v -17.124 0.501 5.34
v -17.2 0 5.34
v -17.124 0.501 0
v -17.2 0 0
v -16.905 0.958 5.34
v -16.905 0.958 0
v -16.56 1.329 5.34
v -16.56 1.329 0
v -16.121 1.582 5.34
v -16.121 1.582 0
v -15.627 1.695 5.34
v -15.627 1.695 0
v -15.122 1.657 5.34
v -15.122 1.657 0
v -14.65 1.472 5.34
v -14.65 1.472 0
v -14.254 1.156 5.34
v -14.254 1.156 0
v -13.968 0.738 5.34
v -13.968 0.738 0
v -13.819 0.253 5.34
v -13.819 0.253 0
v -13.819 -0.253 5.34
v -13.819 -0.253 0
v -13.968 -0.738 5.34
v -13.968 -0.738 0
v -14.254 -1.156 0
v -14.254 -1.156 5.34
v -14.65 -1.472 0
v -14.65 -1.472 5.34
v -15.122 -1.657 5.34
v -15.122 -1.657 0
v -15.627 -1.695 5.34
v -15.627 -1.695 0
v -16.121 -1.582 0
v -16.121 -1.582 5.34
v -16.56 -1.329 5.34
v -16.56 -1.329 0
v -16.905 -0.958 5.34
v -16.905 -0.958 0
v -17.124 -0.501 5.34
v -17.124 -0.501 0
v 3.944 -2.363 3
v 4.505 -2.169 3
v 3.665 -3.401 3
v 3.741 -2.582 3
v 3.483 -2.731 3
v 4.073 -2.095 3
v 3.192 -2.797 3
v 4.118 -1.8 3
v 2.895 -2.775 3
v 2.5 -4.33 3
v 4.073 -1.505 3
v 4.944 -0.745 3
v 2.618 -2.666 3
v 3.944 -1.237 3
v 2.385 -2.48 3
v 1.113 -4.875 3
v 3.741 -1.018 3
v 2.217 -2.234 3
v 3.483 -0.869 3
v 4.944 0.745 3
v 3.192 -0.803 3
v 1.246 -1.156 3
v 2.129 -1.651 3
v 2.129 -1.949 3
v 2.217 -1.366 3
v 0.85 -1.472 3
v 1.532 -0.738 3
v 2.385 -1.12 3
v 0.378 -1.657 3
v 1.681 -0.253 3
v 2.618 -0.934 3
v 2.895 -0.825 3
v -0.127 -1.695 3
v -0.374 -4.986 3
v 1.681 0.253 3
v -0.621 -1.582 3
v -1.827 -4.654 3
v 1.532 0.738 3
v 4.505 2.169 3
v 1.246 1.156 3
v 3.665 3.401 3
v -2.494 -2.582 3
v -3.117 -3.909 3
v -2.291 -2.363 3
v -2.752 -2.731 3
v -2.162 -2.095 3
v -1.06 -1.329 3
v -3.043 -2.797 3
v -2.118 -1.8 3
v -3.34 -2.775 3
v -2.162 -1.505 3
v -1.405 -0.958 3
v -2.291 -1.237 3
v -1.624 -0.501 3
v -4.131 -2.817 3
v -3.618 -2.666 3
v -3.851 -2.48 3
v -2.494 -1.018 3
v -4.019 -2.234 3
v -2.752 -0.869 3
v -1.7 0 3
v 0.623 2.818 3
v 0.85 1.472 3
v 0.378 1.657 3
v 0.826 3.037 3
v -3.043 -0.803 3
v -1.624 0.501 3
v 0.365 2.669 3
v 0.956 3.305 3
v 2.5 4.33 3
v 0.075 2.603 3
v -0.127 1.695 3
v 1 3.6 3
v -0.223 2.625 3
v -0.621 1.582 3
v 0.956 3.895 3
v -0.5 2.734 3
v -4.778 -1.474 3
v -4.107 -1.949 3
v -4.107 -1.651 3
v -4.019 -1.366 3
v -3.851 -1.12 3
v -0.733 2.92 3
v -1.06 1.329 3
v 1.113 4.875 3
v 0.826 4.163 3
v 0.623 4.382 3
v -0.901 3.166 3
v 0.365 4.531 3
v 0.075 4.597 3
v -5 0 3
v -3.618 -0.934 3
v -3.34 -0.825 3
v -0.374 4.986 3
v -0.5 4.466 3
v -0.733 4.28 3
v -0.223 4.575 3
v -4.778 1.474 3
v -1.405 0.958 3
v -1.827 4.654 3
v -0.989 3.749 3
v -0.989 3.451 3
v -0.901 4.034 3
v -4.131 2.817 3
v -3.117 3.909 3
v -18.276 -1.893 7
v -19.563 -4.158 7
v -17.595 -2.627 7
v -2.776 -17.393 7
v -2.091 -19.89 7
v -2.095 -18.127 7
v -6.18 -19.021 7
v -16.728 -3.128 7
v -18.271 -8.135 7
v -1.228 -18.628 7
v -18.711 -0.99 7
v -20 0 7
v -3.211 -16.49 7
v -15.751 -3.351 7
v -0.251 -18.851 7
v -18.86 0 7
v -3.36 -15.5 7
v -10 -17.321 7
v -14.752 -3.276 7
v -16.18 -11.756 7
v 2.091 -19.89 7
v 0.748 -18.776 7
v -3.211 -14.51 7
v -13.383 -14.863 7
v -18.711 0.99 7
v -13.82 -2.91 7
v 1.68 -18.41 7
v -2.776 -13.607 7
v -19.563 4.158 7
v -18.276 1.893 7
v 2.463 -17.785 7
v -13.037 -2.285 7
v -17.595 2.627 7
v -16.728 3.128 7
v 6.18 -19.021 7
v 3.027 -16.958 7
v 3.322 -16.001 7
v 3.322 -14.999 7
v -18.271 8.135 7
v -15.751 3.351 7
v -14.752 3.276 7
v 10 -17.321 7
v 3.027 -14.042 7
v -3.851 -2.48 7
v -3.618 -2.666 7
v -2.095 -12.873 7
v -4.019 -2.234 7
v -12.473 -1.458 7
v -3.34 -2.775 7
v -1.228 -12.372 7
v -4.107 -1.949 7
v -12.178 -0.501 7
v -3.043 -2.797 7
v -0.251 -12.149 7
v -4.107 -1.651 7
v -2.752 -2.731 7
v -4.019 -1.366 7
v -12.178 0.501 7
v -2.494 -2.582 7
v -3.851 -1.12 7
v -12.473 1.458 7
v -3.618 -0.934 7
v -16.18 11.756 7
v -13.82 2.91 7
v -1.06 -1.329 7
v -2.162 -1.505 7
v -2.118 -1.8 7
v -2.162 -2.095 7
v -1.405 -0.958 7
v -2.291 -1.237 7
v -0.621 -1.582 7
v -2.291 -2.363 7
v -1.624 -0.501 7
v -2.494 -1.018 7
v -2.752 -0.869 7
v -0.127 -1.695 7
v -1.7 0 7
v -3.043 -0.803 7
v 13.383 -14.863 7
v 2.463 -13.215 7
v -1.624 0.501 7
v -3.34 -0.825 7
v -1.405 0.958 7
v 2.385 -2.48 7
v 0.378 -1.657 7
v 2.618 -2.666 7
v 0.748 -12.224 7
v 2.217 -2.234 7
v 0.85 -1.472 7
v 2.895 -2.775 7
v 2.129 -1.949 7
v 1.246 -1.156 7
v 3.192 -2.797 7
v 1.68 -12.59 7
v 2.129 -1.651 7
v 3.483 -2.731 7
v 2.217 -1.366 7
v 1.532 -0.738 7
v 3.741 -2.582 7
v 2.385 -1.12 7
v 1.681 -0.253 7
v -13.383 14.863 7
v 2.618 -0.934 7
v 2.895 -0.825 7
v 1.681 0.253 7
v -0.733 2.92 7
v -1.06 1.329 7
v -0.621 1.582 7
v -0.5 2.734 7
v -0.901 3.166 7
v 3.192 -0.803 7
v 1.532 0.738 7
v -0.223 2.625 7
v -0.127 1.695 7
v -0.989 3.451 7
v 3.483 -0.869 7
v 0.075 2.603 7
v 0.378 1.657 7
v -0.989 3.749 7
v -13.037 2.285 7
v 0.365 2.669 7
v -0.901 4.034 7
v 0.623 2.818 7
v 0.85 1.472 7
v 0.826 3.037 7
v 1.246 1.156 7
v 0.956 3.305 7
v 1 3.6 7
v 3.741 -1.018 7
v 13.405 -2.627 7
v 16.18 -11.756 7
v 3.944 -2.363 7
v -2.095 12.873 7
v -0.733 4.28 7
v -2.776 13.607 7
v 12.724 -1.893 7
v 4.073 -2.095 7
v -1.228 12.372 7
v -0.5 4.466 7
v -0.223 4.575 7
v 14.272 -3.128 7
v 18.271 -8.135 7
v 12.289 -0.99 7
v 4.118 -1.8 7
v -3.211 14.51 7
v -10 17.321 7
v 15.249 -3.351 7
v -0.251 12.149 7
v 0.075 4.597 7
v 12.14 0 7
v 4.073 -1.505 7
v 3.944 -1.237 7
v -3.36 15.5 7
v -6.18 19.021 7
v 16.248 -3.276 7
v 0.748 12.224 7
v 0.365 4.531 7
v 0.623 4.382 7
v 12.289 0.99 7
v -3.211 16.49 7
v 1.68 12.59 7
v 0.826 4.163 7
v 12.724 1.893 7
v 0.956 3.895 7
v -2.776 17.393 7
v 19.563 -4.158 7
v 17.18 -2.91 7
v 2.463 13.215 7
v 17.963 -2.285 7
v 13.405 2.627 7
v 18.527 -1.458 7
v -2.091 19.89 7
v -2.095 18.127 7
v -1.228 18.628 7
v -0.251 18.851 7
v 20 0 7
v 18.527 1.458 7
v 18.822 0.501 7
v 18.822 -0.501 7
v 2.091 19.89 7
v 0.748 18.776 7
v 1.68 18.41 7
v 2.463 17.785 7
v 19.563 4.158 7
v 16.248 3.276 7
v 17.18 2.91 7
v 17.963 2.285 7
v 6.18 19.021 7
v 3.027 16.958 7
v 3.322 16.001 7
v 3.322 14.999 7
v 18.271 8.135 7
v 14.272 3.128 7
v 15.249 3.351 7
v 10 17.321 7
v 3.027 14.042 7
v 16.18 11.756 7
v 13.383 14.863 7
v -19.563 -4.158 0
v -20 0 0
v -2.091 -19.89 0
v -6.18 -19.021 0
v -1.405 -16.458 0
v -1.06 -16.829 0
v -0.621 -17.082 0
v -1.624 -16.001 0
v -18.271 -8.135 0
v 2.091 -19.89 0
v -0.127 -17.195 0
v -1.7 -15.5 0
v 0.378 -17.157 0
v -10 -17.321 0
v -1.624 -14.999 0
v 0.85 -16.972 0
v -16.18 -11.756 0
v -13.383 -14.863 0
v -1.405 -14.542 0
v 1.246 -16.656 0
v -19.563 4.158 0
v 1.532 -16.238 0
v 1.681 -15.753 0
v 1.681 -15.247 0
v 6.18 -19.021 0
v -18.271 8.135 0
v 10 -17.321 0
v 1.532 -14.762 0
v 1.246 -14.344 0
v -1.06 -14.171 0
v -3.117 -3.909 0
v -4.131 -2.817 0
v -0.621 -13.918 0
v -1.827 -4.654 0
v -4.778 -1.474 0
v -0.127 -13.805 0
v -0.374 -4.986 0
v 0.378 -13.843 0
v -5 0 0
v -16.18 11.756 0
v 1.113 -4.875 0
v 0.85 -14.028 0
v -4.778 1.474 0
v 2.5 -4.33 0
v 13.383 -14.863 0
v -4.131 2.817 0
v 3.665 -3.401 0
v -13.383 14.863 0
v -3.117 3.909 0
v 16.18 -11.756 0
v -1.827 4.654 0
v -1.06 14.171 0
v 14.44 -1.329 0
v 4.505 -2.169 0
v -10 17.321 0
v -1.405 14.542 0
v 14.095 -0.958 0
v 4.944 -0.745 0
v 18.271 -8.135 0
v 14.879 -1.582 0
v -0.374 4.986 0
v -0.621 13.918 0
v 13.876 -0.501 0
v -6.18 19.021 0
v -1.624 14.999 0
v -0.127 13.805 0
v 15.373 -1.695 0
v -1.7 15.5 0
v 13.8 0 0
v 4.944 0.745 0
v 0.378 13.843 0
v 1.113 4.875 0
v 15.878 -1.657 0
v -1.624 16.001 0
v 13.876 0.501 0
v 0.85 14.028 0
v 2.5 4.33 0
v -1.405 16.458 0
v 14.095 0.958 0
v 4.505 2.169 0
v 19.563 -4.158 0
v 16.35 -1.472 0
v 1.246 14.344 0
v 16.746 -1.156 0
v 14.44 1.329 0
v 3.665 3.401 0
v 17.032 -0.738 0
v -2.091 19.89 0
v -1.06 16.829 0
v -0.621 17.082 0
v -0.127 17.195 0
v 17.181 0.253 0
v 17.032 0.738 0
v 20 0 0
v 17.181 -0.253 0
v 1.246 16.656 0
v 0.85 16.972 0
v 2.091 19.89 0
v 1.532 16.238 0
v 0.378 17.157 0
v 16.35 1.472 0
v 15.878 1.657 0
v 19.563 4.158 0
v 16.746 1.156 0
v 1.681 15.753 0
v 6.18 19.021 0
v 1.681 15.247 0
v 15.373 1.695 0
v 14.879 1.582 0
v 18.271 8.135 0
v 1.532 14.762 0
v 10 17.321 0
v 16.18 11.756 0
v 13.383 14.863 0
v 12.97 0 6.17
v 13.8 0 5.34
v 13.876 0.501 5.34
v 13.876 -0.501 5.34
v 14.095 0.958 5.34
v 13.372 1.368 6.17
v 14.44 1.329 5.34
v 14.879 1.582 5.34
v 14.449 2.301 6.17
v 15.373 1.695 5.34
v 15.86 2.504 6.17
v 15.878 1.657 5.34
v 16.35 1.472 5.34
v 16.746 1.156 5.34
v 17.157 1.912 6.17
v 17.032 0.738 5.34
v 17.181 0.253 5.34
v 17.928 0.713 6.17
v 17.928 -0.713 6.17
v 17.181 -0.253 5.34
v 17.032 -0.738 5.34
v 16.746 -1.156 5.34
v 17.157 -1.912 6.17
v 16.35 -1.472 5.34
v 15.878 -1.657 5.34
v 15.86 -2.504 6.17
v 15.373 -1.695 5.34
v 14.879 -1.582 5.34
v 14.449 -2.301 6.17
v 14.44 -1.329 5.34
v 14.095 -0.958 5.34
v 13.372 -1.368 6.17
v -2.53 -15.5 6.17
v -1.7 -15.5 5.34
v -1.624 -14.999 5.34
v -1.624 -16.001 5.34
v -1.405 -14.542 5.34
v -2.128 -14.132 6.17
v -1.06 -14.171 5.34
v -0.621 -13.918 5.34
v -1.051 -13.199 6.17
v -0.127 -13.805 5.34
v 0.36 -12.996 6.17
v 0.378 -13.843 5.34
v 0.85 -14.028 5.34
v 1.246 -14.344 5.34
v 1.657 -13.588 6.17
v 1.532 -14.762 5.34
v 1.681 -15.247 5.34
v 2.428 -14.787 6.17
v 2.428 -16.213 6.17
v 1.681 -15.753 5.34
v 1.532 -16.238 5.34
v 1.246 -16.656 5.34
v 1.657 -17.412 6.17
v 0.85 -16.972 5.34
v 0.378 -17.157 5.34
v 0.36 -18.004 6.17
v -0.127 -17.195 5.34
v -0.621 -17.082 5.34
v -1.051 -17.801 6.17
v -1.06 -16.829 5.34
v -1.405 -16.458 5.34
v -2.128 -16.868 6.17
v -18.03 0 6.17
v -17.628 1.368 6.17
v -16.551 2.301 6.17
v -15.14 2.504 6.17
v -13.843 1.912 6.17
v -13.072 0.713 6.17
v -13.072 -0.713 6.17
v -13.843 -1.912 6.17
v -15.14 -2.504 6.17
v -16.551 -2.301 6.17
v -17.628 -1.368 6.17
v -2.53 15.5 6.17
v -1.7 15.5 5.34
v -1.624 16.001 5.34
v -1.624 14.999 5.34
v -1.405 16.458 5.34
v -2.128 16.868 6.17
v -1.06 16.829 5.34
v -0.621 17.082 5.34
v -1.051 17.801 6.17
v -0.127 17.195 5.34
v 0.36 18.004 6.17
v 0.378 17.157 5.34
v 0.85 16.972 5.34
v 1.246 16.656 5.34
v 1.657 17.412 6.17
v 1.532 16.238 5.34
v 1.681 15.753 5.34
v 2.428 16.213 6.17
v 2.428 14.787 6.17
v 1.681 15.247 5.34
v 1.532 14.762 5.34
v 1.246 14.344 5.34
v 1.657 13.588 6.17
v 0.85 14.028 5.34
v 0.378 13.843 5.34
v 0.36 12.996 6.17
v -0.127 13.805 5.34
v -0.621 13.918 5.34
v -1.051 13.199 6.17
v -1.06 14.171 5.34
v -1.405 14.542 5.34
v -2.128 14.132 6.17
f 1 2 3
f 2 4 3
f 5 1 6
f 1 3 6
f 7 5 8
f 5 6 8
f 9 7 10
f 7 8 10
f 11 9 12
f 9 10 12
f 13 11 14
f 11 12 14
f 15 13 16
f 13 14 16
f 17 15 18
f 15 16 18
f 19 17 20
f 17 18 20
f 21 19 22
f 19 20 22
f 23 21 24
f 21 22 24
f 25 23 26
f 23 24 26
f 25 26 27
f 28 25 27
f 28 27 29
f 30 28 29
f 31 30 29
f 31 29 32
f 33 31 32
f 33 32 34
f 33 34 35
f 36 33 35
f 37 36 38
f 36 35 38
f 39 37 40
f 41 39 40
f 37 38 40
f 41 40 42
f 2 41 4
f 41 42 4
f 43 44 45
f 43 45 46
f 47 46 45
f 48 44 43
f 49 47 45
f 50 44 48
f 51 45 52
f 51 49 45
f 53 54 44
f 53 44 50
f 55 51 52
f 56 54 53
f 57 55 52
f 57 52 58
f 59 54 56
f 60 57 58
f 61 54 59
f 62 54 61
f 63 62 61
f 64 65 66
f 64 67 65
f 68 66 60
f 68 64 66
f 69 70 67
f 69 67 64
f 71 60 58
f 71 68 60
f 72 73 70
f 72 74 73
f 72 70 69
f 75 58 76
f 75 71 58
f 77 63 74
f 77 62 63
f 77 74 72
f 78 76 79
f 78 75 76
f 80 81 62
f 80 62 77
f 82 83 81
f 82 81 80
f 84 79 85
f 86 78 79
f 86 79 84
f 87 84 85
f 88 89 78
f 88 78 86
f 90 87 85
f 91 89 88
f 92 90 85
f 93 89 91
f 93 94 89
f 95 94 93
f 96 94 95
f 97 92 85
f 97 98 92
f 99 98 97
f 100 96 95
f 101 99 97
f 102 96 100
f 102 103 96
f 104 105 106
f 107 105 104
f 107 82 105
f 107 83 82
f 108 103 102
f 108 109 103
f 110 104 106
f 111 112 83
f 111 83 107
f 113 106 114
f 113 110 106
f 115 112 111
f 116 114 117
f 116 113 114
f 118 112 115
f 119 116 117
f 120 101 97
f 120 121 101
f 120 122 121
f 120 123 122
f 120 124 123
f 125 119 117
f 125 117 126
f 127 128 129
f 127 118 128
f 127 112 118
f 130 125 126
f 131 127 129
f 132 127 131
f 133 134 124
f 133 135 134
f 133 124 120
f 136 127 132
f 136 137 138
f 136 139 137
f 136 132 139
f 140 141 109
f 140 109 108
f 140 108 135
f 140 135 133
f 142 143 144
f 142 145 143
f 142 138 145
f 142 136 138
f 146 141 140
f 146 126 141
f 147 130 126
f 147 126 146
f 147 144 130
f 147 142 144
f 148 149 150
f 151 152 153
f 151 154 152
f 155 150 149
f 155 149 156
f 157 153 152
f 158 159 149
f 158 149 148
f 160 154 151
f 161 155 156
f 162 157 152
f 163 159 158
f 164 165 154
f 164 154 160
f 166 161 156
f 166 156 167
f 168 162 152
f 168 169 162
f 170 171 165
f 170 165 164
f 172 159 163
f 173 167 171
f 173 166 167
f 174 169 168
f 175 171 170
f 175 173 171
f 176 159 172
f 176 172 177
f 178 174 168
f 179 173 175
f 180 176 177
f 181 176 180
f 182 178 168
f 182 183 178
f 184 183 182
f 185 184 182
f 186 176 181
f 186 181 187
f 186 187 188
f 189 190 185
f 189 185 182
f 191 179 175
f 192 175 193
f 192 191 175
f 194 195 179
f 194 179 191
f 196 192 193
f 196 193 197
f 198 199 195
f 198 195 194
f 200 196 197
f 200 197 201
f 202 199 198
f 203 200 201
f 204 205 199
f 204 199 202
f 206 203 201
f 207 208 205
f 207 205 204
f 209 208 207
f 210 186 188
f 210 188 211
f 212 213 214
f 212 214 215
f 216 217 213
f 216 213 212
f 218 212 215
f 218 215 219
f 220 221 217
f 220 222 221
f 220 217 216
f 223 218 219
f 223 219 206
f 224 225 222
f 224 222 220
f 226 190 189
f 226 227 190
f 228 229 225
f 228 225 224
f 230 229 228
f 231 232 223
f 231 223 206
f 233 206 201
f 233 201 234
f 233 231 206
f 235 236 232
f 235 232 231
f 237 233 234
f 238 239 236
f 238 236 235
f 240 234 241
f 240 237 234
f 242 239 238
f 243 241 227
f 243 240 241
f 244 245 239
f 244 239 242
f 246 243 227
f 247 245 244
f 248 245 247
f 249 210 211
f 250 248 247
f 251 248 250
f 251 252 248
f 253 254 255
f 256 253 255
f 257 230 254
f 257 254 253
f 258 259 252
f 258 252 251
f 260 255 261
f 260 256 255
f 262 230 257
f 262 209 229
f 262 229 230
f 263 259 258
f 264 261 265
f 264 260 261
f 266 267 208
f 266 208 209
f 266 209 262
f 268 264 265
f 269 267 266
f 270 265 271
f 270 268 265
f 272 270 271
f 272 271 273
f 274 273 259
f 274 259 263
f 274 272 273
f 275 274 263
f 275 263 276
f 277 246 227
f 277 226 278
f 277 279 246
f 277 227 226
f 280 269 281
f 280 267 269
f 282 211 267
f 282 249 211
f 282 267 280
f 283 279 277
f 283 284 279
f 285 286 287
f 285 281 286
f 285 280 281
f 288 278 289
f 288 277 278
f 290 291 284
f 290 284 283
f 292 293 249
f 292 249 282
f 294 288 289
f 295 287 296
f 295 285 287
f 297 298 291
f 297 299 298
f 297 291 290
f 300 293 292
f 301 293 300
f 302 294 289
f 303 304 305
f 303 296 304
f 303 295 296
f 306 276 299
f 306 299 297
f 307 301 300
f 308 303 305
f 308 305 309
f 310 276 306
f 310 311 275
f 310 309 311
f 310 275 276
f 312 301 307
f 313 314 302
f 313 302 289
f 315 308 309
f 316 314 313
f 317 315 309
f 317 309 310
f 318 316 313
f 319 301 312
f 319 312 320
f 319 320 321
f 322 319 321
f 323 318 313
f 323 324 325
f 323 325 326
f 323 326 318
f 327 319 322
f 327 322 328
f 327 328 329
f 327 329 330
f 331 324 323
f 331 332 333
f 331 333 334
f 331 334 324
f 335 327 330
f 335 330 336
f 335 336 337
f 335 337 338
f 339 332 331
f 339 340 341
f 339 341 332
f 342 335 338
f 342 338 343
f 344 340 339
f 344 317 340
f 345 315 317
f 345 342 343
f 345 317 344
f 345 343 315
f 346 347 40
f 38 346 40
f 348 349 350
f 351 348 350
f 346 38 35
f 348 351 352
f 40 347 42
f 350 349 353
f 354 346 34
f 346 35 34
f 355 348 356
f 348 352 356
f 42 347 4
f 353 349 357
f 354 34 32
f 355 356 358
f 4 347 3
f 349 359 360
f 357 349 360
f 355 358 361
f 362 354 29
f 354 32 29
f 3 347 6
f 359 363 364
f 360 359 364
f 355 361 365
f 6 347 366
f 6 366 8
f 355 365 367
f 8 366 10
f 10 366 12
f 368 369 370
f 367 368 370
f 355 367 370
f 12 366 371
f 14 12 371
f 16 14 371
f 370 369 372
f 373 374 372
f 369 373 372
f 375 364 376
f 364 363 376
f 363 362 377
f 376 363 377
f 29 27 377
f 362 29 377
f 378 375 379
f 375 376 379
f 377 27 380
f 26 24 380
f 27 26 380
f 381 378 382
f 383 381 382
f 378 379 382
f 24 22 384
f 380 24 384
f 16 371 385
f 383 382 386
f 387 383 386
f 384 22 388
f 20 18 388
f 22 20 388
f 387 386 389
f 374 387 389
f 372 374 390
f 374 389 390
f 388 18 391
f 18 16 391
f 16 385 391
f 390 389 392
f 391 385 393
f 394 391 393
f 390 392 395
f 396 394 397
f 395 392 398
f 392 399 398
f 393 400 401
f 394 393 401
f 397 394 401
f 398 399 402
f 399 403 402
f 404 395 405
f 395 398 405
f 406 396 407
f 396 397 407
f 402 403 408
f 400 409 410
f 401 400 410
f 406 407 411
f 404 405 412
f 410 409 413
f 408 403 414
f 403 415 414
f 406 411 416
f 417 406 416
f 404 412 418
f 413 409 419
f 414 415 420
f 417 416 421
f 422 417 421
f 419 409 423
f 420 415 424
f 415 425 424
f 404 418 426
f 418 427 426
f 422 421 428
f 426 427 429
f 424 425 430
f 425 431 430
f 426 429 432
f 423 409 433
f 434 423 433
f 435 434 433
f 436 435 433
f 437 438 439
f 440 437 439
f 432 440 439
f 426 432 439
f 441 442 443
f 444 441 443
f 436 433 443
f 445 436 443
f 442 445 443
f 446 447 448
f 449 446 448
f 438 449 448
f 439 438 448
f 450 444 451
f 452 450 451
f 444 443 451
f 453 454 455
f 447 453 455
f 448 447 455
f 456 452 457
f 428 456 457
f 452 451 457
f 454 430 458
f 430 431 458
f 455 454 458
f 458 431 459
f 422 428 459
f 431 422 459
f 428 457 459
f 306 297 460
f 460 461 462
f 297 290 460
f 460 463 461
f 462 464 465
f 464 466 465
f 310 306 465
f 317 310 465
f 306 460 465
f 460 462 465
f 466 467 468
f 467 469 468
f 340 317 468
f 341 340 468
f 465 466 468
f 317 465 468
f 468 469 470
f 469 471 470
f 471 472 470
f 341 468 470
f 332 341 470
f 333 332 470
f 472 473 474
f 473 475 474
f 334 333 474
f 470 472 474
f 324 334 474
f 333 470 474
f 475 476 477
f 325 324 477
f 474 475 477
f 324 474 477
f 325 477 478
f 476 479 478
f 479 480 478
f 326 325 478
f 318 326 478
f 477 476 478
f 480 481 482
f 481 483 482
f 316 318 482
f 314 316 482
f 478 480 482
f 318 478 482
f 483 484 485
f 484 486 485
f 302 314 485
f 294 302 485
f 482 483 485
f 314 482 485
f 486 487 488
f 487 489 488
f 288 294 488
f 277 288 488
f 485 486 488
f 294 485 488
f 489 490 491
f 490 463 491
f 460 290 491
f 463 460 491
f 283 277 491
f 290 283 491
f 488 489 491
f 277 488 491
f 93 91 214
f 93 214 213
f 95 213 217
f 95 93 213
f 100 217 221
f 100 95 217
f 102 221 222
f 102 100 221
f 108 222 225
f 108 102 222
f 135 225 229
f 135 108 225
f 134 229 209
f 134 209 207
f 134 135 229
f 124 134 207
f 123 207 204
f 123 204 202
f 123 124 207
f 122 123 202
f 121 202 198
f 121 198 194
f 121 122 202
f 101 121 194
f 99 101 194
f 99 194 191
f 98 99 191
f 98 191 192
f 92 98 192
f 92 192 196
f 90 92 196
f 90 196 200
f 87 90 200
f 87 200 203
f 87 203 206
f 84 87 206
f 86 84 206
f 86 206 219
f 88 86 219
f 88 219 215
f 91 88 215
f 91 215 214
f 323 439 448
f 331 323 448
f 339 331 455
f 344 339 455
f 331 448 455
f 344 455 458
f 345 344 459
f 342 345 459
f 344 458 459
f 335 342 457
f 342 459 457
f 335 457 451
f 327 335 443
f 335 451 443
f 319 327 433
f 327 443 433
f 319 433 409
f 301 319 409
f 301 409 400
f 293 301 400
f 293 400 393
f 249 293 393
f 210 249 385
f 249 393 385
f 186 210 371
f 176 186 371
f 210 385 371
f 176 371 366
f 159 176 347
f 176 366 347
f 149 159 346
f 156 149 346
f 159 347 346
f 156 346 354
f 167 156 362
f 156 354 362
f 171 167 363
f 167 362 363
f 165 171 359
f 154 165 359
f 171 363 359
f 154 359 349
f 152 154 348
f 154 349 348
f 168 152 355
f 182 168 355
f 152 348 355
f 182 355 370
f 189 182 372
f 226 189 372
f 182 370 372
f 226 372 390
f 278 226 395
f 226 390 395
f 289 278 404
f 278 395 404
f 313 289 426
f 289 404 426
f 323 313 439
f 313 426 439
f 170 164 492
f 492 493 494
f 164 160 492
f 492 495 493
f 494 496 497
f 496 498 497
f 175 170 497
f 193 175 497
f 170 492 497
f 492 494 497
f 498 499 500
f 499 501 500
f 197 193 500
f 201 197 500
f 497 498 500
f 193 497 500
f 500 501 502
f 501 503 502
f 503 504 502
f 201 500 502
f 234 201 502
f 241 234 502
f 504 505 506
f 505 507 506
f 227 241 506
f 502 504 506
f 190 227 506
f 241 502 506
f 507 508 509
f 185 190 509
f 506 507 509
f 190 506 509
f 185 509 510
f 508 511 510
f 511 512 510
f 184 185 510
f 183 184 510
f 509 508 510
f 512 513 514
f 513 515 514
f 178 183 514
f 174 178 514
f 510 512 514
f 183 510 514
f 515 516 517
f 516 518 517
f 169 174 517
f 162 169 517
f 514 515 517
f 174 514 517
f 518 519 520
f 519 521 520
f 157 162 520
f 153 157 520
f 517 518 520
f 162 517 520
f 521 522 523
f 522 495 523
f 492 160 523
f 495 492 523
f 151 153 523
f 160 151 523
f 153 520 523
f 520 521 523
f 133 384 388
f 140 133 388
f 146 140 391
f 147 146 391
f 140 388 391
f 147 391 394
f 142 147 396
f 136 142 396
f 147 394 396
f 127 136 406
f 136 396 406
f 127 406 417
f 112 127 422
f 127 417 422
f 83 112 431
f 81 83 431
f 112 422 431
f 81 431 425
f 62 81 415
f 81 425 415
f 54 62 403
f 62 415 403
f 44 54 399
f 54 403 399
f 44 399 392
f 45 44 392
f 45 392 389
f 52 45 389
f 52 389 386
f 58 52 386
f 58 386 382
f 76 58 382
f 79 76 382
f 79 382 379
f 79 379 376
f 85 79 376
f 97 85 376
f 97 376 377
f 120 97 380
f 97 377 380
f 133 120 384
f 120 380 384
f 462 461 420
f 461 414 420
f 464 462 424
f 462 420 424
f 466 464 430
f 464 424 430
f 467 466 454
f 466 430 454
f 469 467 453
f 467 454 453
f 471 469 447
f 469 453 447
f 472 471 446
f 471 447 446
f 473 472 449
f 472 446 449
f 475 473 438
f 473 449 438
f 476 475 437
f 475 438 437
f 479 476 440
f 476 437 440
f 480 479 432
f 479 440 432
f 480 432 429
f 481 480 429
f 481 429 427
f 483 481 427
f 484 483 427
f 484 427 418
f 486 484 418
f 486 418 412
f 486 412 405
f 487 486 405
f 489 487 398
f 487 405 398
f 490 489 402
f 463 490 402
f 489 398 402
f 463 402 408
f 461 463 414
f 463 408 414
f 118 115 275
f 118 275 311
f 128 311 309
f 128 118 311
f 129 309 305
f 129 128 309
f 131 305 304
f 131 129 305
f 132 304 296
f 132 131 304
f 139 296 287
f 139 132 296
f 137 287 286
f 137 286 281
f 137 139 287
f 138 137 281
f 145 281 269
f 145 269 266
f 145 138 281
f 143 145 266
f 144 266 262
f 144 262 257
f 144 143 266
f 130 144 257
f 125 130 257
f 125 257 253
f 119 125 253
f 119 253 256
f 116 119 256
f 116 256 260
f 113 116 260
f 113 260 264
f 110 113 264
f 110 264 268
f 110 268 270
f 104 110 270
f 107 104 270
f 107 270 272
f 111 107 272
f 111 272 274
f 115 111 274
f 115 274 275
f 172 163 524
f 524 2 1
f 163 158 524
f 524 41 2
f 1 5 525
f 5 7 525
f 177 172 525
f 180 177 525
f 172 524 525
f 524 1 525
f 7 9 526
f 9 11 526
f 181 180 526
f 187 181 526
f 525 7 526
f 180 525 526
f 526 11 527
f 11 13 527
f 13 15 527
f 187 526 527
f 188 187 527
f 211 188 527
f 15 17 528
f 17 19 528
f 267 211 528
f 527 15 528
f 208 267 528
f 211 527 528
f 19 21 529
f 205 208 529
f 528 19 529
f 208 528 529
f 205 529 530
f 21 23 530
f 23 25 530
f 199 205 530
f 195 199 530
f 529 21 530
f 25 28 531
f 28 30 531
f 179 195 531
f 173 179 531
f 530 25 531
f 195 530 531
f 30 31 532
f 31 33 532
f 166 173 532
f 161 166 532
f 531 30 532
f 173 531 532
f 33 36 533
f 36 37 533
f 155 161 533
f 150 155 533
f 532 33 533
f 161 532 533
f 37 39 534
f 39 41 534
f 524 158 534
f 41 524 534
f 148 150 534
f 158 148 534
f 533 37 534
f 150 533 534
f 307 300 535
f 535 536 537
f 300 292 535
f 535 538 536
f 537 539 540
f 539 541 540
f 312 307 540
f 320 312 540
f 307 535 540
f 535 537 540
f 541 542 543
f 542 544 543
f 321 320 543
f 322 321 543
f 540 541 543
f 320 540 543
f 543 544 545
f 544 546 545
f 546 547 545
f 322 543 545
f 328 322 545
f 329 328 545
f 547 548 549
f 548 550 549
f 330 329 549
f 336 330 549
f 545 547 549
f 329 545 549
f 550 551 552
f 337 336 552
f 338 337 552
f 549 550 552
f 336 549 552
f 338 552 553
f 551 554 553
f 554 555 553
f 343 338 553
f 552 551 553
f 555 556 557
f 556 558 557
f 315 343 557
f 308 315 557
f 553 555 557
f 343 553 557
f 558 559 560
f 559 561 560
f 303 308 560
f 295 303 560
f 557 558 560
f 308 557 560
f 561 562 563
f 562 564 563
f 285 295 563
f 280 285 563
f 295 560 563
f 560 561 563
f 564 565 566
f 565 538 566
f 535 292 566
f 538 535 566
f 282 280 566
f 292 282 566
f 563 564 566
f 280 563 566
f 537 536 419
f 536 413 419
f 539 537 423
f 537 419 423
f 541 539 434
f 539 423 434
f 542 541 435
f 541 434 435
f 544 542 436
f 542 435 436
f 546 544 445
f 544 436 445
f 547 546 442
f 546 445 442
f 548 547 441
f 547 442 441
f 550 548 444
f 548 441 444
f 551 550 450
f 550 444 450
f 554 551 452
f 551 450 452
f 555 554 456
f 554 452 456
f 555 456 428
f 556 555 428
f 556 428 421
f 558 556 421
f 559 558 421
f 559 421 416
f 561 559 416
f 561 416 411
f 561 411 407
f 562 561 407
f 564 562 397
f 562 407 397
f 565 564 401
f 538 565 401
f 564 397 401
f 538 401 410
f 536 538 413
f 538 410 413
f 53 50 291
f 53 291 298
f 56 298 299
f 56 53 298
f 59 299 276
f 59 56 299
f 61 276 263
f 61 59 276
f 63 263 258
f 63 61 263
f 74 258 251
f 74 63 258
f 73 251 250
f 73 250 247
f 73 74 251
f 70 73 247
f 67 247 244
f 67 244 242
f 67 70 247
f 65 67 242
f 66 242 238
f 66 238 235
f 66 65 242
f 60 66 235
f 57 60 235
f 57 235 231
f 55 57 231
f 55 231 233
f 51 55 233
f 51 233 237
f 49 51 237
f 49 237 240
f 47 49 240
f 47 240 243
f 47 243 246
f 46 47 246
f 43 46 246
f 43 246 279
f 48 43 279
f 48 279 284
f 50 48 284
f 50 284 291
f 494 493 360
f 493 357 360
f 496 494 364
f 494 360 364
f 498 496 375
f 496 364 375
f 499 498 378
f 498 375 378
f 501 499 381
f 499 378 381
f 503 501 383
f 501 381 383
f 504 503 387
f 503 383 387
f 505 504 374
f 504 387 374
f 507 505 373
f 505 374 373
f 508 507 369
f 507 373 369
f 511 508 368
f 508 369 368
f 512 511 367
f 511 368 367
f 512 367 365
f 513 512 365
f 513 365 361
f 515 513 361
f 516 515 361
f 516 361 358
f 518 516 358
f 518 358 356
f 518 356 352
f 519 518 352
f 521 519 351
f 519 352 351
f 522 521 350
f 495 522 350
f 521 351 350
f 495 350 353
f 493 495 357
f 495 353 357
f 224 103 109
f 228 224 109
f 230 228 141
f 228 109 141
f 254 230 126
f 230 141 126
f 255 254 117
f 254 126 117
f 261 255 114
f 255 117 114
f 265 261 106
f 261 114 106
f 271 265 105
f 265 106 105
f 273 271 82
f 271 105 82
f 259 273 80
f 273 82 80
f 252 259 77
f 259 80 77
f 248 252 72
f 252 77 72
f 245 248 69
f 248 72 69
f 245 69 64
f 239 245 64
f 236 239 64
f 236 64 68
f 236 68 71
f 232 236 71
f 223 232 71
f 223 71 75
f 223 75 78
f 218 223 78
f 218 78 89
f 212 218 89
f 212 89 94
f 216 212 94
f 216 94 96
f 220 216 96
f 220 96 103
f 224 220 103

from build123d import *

# Parameters (mm, degrees)
CROQUIS1_R                                           = 20
CROQUIS1_R_2                                         = 1
SALIENTE_EXTRUIR1_DEPTH                              = 7
REFRENTADO_PARA_TORNILLO_TAP_N_CON_CABEZ_D           = 3.4
REFRENTADO_PARA_TORNILLO_TAP_N_CON_CABEZ_CSINK_D     = 6.72
REFRENTADO_PARA_TORNILLO_TAP_N_CON_CABEZ_CSINK_ANGLE = 90
TALADRO_DE_MARGEN_PARA_M31_D                         = 3.4
CROQUIS8_R                                           = 5
CORTAR_EXTRUIR1_DEPTH                                = 3


with BuildPart() as part:
    # Croquis1 → Saliente-Extruir1 (new body)
    with BuildSketch(Plane.XY):
        Circle(CROQUIS1_R)
        with Locations((0, 3.6)):
            Circle(CROQUIS1_R_2, mode=Mode.SUBTRACT)
        with Locations((3.117691454, -1.8)):
            Circle(CROQUIS1_R_2, mode=Mode.SUBTRACT)
        with Locations((-3.117691454, -1.8)):
            Circle(CROQUIS1_R_2, mode=Mode.SUBTRACT)
    extrude(amount=SALIENTE_EXTRUIR1_DEPTH)

    # Refrentado para tornillo tapón con cabeza plana de clavija de M31 (through all)
    with Locations(Plane.XY.offset(7)):
        with Locations((0, 15.5), (15.5, 0), (0, -15.5), (-15.5, 0)):
            CounterSinkHole(REFRENTADO_PARA_TORNILLO_TAP_N_CON_CABEZ_D / 2, REFRENTADO_PARA_TORNILLO_TAP_N_CON_CABEZ_CSINK_D / 2, counter_sink_angle=REFRENTADO_PARA_TORNILLO_TAP_N_CON_CABEZ_CSINK_ANGLE)

    # Taladro de margen para M31 (through all)
    with Locations(Plane.XY.offset(7)):
        with Locations((0, 0)):
            Hole(TALADRO_DE_MARGEN_PARA_M31_D / 2)

    # Croquis8 → Cortar-Extruir1 (cut)
    with BuildSketch(Plane(origin=(0, 0, 0), x_dir=(-1, 0, 0), z_dir=(0, 0, -1))):
        Circle(CROQUIS8_R)
    extrude(amount=-CORTAR_EXTRUIR1_DEPTH, mode=Mode.SUBTRACT)


solid = part.part
